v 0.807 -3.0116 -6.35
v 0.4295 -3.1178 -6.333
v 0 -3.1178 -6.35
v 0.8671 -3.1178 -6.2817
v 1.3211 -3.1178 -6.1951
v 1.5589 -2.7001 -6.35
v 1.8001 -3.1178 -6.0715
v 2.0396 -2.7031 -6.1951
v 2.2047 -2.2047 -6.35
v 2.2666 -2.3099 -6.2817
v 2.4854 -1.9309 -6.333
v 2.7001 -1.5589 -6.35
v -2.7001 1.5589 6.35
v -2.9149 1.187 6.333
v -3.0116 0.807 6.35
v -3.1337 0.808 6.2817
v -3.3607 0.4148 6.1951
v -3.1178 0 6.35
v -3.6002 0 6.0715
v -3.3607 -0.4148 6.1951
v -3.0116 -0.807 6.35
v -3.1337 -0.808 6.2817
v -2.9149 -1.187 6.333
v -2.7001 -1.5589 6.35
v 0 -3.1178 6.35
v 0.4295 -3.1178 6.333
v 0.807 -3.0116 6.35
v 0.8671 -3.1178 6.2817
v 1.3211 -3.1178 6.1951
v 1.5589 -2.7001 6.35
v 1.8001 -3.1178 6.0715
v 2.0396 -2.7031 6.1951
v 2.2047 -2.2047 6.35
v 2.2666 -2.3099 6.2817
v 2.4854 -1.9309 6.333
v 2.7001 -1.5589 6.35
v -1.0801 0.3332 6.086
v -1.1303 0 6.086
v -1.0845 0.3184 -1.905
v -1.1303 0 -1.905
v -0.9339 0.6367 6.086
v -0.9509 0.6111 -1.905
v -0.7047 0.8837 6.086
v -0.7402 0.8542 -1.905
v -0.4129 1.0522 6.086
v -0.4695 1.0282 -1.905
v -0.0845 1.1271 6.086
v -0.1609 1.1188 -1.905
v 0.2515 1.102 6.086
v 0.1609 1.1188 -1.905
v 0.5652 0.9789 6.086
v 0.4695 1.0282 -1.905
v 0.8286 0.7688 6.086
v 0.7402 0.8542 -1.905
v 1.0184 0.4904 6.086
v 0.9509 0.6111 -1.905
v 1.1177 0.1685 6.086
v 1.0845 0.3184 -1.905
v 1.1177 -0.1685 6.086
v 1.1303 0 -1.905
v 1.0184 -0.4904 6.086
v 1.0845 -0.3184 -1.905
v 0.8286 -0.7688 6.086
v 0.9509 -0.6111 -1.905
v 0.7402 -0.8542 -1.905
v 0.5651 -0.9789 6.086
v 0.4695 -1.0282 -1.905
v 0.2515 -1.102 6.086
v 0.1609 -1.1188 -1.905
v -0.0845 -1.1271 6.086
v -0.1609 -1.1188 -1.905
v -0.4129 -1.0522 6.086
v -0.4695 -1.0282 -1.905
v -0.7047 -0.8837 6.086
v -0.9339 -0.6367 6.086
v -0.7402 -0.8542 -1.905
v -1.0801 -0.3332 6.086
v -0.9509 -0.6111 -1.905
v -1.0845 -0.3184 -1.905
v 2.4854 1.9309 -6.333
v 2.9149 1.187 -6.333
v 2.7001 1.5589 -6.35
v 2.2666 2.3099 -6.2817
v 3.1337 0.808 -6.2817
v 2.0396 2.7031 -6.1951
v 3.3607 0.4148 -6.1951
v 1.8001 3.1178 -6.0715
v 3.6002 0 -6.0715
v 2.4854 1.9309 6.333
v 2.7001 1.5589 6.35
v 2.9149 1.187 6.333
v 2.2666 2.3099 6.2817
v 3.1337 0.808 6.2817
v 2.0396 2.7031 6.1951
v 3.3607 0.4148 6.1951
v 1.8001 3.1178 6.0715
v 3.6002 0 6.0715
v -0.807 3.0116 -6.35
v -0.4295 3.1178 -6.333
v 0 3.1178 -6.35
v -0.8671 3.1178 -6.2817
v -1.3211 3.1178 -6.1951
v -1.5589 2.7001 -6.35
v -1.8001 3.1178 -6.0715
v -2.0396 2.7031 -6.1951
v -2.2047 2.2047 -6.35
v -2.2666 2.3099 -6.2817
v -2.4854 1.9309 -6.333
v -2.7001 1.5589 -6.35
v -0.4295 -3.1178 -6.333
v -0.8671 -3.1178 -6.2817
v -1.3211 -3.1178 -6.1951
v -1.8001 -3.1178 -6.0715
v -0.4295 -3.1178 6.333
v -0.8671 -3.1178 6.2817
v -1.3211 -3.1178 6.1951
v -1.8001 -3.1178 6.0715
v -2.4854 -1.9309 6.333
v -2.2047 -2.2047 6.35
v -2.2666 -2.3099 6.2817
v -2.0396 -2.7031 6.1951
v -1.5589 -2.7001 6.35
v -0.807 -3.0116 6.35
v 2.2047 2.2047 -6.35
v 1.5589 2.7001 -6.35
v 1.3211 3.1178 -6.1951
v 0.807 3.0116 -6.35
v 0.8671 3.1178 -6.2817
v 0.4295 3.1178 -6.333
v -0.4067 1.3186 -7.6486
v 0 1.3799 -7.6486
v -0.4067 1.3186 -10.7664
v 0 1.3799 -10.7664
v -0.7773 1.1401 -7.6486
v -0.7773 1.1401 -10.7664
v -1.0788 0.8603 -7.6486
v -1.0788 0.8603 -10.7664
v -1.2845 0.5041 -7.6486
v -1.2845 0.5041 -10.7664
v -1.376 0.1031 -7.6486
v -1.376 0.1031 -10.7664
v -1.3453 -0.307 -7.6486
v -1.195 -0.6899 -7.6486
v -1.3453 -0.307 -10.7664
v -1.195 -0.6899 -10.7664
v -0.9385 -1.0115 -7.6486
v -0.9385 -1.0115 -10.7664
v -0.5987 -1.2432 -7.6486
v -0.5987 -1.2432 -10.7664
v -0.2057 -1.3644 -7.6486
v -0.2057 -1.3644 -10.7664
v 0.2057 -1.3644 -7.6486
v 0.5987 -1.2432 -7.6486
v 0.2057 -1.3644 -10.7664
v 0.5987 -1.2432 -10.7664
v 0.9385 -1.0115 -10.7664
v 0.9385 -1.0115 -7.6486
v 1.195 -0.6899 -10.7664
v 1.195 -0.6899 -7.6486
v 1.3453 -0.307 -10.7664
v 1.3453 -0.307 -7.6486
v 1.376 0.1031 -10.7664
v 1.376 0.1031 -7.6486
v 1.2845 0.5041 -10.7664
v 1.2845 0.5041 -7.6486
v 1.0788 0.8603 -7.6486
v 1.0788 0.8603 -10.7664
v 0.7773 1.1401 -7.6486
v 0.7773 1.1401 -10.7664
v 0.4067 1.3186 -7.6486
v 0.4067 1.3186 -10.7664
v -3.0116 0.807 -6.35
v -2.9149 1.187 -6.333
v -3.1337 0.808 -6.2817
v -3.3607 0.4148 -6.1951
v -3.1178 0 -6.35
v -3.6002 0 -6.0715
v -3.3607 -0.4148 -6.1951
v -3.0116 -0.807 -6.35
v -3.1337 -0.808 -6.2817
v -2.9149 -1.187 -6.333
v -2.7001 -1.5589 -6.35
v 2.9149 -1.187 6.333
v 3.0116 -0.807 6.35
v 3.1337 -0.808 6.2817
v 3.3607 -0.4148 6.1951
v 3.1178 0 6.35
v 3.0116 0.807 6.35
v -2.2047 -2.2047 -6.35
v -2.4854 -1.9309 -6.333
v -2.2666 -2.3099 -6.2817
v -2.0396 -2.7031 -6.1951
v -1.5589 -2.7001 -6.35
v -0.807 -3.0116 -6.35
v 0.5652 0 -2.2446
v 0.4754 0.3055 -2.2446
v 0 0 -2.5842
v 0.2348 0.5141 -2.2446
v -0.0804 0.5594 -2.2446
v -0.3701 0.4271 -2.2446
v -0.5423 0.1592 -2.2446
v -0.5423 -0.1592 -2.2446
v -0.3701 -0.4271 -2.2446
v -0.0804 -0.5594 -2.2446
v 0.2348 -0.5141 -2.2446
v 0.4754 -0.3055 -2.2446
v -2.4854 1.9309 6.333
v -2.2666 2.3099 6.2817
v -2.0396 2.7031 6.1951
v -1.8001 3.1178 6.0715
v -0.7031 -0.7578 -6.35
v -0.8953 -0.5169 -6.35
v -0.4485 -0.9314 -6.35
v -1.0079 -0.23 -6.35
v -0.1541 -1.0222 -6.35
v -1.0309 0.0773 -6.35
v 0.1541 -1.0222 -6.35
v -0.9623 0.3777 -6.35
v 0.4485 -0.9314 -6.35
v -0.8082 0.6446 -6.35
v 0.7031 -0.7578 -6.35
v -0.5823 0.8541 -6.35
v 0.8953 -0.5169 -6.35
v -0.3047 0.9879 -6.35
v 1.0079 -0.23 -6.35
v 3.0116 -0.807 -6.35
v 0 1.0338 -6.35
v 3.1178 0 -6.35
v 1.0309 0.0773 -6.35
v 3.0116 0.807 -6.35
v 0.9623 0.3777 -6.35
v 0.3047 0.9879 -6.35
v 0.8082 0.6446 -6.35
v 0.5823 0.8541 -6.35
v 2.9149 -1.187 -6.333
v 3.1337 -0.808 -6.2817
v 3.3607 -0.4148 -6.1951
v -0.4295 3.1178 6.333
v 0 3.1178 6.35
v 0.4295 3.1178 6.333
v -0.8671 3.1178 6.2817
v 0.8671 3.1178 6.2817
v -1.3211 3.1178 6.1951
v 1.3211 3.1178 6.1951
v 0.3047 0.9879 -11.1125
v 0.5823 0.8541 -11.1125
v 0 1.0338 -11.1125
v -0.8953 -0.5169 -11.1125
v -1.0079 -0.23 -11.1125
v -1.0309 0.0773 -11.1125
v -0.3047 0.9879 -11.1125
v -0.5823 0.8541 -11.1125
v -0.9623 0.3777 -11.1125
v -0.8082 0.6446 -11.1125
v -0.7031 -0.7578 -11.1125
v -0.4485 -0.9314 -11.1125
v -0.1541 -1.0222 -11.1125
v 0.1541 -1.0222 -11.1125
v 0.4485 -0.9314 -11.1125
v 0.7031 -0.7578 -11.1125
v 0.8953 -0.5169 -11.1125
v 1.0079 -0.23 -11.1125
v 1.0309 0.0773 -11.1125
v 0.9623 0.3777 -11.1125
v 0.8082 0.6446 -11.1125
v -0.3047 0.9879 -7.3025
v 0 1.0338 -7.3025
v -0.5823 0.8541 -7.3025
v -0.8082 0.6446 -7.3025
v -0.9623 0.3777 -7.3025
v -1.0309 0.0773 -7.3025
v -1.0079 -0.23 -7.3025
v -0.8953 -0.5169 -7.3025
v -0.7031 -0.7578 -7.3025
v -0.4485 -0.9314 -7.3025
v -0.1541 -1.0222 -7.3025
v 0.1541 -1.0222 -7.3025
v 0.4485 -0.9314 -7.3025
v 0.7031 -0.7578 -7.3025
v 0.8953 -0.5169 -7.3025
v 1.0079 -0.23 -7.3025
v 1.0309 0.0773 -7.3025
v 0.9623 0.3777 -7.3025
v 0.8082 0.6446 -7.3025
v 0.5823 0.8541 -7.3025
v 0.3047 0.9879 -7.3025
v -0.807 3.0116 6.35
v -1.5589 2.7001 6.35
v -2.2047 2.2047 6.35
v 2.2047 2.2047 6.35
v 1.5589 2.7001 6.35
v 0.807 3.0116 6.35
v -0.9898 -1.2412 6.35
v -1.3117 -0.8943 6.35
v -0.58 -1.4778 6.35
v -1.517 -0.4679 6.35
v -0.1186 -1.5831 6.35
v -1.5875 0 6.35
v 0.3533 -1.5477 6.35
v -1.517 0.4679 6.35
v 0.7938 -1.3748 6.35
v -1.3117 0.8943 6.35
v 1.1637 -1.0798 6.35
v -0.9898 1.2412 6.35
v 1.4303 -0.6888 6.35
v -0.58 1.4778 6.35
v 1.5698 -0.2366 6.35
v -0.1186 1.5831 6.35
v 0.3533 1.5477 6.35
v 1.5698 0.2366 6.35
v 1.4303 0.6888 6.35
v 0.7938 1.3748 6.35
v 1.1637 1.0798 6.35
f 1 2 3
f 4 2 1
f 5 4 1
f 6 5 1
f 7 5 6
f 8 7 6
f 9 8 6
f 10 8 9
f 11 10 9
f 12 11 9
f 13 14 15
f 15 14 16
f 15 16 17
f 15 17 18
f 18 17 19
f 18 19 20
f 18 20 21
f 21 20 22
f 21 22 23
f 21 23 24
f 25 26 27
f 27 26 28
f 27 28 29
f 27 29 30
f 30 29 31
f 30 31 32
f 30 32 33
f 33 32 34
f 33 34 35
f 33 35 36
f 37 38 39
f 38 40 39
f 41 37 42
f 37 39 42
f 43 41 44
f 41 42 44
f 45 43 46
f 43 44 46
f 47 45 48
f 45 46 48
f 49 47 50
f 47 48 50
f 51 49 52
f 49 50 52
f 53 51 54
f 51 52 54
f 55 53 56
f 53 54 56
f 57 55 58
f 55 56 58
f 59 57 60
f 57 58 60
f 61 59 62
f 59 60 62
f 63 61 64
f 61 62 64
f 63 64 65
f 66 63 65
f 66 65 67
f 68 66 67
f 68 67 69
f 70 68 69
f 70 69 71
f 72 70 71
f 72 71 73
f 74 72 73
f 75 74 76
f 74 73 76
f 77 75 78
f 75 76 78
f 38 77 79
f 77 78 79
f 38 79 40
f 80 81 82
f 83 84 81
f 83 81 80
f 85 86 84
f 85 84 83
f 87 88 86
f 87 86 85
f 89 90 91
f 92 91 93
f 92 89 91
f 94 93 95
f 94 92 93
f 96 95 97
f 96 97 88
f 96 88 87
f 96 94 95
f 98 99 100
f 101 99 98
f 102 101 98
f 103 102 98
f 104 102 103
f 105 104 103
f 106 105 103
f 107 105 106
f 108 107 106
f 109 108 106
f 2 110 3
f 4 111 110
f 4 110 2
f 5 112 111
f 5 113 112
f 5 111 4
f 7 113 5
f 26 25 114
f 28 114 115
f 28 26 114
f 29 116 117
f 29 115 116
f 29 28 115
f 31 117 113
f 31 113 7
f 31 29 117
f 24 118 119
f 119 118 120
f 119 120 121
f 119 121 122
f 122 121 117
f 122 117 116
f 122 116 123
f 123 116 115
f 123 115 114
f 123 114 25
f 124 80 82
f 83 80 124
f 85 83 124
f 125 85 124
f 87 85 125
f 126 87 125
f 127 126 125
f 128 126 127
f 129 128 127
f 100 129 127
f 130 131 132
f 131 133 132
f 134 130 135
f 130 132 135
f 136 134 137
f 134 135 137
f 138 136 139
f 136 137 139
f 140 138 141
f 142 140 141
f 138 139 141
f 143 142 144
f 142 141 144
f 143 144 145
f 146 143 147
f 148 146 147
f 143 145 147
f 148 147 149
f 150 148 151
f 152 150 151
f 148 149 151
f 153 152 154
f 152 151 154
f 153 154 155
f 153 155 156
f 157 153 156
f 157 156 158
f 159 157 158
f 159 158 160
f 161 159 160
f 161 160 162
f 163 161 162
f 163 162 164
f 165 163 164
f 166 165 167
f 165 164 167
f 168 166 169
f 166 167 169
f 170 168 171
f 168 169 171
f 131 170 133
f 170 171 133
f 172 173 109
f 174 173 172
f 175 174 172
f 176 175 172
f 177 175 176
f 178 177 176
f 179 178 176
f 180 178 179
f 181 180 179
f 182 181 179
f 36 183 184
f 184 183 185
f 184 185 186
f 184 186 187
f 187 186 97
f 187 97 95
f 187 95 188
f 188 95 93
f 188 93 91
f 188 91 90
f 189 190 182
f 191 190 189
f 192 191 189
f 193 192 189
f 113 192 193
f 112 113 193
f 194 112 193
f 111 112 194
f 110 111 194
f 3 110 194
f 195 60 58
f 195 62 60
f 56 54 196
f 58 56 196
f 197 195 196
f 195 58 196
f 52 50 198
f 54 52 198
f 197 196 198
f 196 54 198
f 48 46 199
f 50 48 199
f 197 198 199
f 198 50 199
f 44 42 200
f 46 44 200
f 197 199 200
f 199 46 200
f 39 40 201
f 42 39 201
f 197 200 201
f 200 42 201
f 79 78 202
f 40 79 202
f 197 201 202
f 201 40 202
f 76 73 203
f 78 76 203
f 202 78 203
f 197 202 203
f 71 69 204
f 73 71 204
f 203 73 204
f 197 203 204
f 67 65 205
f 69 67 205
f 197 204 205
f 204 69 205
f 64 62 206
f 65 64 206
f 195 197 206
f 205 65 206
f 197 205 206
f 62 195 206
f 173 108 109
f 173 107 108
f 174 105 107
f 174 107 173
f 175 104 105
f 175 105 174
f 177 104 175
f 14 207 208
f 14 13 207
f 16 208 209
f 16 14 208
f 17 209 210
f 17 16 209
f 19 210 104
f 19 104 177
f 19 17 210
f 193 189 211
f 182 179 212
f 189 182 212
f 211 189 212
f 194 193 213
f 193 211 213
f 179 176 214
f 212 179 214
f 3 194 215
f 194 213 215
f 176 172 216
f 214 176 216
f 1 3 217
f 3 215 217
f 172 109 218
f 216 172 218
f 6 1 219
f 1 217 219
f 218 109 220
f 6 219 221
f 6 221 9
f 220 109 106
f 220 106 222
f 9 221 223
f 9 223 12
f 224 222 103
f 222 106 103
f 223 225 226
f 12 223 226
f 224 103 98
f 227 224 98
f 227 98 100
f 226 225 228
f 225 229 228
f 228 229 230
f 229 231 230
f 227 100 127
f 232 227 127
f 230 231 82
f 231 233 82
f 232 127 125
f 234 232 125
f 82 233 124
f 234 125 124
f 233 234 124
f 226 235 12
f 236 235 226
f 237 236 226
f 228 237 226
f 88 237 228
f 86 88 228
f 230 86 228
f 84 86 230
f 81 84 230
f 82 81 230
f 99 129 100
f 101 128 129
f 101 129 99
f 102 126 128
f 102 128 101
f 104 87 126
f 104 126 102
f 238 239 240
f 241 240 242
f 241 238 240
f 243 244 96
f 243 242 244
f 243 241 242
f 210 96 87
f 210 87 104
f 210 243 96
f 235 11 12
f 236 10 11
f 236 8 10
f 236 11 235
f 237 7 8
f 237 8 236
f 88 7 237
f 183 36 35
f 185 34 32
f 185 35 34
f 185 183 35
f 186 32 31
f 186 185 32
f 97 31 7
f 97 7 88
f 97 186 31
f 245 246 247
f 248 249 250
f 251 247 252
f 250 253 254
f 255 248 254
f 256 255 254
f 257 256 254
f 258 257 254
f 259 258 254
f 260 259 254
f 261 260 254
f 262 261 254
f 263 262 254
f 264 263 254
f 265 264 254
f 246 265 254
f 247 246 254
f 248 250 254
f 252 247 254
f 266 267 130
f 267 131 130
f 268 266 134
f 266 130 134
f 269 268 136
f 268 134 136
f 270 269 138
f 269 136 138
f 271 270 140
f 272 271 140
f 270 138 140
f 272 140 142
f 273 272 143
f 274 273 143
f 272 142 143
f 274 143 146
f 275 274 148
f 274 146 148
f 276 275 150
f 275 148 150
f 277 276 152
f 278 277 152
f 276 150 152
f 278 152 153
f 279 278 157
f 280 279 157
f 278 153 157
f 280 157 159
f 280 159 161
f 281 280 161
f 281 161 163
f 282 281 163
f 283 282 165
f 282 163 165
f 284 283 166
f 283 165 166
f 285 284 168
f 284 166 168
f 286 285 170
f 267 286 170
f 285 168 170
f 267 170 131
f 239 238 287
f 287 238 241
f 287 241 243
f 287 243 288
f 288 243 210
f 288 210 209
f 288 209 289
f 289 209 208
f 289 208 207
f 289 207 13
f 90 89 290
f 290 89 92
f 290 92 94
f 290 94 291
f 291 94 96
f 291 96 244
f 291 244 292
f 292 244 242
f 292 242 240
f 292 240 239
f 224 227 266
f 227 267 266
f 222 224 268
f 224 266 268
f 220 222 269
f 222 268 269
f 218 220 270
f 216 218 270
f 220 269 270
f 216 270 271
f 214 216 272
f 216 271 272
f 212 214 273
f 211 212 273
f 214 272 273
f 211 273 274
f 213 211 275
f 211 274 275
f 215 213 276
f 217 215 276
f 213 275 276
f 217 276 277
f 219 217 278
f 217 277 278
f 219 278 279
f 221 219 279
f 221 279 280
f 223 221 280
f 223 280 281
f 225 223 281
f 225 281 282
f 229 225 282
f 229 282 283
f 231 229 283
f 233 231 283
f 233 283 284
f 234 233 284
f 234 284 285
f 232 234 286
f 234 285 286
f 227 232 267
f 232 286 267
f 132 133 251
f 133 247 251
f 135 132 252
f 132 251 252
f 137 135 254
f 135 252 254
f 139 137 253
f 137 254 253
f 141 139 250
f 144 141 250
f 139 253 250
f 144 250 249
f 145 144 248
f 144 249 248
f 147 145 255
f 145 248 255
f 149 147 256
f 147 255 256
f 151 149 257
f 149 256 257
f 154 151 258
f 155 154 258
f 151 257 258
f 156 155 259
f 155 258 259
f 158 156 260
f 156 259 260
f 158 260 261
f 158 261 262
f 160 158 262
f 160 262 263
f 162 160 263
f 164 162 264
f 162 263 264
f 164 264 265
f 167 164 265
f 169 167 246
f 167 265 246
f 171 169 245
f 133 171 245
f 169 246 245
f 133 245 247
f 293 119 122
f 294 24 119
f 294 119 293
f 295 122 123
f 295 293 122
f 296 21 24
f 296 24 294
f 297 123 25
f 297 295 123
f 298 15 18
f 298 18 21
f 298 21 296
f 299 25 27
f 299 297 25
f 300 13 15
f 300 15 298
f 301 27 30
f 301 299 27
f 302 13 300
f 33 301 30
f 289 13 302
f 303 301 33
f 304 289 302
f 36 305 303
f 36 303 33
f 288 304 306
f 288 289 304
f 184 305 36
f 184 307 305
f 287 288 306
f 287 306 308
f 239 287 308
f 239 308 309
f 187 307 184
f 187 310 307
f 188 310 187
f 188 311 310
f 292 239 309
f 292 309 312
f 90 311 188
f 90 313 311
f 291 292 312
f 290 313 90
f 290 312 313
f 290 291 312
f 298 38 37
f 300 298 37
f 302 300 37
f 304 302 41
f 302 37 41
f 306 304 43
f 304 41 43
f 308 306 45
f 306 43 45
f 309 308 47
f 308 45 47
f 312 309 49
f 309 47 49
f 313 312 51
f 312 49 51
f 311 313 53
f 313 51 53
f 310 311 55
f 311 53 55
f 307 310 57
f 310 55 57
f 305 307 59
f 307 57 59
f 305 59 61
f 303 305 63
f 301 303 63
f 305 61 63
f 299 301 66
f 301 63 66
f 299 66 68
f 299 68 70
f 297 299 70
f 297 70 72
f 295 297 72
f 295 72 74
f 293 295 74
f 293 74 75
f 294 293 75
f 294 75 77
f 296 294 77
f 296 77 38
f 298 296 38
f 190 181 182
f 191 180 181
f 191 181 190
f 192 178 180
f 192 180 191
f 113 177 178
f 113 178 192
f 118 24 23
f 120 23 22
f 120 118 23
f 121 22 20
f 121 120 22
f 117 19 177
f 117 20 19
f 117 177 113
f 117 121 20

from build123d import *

# Parameters (mm, degrees)
EXTRUDE1_DEPTH                                 = 6.35
F_4_40_TAPPED_HOLE1_STANDARD_DEPTH_D           = 2.2606
F_4_40_TAPPED_HOLE1_STANDARD_DEPTH_DEPTH       = 8.255
F_4_40_TAPPED_HOLE1_STANDARD_DEPTH_CSINK_D     = 3.175
F_4_40_TAPPED_HOLE1_STANDARD_DEPTH_CSINK_ANGLE = 120
F_4_40_TAPPED_HOLE1_STANDARD_DEPTH_TIP         = 0.679152758


with BuildPart() as part:
    # Sketch1 → Extrude1 (new body, symmetric)
    with BuildSketch(Plane.XY):
        Polygon((3.600183074, 0), (1.800091537, 3.11785), (-1.800091537, 3.11785), (-3.600183074, 0), (-1.800091537, -3.11785), (1.800091537, -3.11785), align=None)
    extrude(amount=EXTRUDE1_DEPTH, both=True)

    # Sketch3 → Cut-Revolve1 (revolve, cut)
    with BuildSketch(Plane(origin=(0, 0, 0), x_dir=(0, 0, -1), z_dir=(1, 0, 0))):
        Polygon((-6.35, 3.11785), (-5.47011819, 4.64185), (-6.604, 4.64185), (-6.604, 3.11785), align=None)
    cut_revolve1 = revolve(axis=Axis((0, 0, 6.35), (0, 0, 1)), mode=Mode.SUBTRACT)

    # Mirror1: Cut-Revolve1 across plane
    add(cut_revolve1.mirror(Plane.XY), mode=Mode.SUBTRACT)

    # Sketch2 → 4-40 stud (revolve)
    with BuildSketch(Plane(origin=(0, 0, 0), x_dir=(0, 0, -1), z_dir=(1, 0, 0))):
        Polygon((6.35, 1.03378), (7.3025, 1.03378), (7.648575, 1.379855), (10.766425, 1.379855), (11.1125, 1.03378), (11.1125, 0), (6.35, 0), align=None)
    revolve(axis=Axis((0, 0, -6.35), (0, 0, 1)))

    # #4-40 Tapped Hole1 (STANDARD DEPTH)
    with Locations(Plane.XY.offset(6.35)):
        with Locations((0, 0)):
            CounterSinkHole(F_4_40_TAPPED_HOLE1_STANDARD_DEPTH_D / 2, F_4_40_TAPPED_HOLE1_STANDARD_DEPTH_CSINK_D / 2, depth=F_4_40_TAPPED_HOLE1_STANDARD_DEPTH_DEPTH, counter_sink_angle=F_4_40_TAPPED_HOLE1_STANDARD_DEPTH_CSINK_ANGLE)
            with Locations((0, 0, -(F_4_40_TAPPED_HOLE1_STANDARD_DEPTH_DEPTH + F_4_40_TAPPED_HOLE1_STANDARD_DEPTH_TIP / 2))):  # 118° drill point
                Cone(0, F_4_40_TAPPED_HOLE1_STANDARD_DEPTH_D / 2, F_4_40_TAPPED_HOLE1_STANDARD_DEPTH_TIP, mode=Mode.SUBTRACT)


solid = part.part
